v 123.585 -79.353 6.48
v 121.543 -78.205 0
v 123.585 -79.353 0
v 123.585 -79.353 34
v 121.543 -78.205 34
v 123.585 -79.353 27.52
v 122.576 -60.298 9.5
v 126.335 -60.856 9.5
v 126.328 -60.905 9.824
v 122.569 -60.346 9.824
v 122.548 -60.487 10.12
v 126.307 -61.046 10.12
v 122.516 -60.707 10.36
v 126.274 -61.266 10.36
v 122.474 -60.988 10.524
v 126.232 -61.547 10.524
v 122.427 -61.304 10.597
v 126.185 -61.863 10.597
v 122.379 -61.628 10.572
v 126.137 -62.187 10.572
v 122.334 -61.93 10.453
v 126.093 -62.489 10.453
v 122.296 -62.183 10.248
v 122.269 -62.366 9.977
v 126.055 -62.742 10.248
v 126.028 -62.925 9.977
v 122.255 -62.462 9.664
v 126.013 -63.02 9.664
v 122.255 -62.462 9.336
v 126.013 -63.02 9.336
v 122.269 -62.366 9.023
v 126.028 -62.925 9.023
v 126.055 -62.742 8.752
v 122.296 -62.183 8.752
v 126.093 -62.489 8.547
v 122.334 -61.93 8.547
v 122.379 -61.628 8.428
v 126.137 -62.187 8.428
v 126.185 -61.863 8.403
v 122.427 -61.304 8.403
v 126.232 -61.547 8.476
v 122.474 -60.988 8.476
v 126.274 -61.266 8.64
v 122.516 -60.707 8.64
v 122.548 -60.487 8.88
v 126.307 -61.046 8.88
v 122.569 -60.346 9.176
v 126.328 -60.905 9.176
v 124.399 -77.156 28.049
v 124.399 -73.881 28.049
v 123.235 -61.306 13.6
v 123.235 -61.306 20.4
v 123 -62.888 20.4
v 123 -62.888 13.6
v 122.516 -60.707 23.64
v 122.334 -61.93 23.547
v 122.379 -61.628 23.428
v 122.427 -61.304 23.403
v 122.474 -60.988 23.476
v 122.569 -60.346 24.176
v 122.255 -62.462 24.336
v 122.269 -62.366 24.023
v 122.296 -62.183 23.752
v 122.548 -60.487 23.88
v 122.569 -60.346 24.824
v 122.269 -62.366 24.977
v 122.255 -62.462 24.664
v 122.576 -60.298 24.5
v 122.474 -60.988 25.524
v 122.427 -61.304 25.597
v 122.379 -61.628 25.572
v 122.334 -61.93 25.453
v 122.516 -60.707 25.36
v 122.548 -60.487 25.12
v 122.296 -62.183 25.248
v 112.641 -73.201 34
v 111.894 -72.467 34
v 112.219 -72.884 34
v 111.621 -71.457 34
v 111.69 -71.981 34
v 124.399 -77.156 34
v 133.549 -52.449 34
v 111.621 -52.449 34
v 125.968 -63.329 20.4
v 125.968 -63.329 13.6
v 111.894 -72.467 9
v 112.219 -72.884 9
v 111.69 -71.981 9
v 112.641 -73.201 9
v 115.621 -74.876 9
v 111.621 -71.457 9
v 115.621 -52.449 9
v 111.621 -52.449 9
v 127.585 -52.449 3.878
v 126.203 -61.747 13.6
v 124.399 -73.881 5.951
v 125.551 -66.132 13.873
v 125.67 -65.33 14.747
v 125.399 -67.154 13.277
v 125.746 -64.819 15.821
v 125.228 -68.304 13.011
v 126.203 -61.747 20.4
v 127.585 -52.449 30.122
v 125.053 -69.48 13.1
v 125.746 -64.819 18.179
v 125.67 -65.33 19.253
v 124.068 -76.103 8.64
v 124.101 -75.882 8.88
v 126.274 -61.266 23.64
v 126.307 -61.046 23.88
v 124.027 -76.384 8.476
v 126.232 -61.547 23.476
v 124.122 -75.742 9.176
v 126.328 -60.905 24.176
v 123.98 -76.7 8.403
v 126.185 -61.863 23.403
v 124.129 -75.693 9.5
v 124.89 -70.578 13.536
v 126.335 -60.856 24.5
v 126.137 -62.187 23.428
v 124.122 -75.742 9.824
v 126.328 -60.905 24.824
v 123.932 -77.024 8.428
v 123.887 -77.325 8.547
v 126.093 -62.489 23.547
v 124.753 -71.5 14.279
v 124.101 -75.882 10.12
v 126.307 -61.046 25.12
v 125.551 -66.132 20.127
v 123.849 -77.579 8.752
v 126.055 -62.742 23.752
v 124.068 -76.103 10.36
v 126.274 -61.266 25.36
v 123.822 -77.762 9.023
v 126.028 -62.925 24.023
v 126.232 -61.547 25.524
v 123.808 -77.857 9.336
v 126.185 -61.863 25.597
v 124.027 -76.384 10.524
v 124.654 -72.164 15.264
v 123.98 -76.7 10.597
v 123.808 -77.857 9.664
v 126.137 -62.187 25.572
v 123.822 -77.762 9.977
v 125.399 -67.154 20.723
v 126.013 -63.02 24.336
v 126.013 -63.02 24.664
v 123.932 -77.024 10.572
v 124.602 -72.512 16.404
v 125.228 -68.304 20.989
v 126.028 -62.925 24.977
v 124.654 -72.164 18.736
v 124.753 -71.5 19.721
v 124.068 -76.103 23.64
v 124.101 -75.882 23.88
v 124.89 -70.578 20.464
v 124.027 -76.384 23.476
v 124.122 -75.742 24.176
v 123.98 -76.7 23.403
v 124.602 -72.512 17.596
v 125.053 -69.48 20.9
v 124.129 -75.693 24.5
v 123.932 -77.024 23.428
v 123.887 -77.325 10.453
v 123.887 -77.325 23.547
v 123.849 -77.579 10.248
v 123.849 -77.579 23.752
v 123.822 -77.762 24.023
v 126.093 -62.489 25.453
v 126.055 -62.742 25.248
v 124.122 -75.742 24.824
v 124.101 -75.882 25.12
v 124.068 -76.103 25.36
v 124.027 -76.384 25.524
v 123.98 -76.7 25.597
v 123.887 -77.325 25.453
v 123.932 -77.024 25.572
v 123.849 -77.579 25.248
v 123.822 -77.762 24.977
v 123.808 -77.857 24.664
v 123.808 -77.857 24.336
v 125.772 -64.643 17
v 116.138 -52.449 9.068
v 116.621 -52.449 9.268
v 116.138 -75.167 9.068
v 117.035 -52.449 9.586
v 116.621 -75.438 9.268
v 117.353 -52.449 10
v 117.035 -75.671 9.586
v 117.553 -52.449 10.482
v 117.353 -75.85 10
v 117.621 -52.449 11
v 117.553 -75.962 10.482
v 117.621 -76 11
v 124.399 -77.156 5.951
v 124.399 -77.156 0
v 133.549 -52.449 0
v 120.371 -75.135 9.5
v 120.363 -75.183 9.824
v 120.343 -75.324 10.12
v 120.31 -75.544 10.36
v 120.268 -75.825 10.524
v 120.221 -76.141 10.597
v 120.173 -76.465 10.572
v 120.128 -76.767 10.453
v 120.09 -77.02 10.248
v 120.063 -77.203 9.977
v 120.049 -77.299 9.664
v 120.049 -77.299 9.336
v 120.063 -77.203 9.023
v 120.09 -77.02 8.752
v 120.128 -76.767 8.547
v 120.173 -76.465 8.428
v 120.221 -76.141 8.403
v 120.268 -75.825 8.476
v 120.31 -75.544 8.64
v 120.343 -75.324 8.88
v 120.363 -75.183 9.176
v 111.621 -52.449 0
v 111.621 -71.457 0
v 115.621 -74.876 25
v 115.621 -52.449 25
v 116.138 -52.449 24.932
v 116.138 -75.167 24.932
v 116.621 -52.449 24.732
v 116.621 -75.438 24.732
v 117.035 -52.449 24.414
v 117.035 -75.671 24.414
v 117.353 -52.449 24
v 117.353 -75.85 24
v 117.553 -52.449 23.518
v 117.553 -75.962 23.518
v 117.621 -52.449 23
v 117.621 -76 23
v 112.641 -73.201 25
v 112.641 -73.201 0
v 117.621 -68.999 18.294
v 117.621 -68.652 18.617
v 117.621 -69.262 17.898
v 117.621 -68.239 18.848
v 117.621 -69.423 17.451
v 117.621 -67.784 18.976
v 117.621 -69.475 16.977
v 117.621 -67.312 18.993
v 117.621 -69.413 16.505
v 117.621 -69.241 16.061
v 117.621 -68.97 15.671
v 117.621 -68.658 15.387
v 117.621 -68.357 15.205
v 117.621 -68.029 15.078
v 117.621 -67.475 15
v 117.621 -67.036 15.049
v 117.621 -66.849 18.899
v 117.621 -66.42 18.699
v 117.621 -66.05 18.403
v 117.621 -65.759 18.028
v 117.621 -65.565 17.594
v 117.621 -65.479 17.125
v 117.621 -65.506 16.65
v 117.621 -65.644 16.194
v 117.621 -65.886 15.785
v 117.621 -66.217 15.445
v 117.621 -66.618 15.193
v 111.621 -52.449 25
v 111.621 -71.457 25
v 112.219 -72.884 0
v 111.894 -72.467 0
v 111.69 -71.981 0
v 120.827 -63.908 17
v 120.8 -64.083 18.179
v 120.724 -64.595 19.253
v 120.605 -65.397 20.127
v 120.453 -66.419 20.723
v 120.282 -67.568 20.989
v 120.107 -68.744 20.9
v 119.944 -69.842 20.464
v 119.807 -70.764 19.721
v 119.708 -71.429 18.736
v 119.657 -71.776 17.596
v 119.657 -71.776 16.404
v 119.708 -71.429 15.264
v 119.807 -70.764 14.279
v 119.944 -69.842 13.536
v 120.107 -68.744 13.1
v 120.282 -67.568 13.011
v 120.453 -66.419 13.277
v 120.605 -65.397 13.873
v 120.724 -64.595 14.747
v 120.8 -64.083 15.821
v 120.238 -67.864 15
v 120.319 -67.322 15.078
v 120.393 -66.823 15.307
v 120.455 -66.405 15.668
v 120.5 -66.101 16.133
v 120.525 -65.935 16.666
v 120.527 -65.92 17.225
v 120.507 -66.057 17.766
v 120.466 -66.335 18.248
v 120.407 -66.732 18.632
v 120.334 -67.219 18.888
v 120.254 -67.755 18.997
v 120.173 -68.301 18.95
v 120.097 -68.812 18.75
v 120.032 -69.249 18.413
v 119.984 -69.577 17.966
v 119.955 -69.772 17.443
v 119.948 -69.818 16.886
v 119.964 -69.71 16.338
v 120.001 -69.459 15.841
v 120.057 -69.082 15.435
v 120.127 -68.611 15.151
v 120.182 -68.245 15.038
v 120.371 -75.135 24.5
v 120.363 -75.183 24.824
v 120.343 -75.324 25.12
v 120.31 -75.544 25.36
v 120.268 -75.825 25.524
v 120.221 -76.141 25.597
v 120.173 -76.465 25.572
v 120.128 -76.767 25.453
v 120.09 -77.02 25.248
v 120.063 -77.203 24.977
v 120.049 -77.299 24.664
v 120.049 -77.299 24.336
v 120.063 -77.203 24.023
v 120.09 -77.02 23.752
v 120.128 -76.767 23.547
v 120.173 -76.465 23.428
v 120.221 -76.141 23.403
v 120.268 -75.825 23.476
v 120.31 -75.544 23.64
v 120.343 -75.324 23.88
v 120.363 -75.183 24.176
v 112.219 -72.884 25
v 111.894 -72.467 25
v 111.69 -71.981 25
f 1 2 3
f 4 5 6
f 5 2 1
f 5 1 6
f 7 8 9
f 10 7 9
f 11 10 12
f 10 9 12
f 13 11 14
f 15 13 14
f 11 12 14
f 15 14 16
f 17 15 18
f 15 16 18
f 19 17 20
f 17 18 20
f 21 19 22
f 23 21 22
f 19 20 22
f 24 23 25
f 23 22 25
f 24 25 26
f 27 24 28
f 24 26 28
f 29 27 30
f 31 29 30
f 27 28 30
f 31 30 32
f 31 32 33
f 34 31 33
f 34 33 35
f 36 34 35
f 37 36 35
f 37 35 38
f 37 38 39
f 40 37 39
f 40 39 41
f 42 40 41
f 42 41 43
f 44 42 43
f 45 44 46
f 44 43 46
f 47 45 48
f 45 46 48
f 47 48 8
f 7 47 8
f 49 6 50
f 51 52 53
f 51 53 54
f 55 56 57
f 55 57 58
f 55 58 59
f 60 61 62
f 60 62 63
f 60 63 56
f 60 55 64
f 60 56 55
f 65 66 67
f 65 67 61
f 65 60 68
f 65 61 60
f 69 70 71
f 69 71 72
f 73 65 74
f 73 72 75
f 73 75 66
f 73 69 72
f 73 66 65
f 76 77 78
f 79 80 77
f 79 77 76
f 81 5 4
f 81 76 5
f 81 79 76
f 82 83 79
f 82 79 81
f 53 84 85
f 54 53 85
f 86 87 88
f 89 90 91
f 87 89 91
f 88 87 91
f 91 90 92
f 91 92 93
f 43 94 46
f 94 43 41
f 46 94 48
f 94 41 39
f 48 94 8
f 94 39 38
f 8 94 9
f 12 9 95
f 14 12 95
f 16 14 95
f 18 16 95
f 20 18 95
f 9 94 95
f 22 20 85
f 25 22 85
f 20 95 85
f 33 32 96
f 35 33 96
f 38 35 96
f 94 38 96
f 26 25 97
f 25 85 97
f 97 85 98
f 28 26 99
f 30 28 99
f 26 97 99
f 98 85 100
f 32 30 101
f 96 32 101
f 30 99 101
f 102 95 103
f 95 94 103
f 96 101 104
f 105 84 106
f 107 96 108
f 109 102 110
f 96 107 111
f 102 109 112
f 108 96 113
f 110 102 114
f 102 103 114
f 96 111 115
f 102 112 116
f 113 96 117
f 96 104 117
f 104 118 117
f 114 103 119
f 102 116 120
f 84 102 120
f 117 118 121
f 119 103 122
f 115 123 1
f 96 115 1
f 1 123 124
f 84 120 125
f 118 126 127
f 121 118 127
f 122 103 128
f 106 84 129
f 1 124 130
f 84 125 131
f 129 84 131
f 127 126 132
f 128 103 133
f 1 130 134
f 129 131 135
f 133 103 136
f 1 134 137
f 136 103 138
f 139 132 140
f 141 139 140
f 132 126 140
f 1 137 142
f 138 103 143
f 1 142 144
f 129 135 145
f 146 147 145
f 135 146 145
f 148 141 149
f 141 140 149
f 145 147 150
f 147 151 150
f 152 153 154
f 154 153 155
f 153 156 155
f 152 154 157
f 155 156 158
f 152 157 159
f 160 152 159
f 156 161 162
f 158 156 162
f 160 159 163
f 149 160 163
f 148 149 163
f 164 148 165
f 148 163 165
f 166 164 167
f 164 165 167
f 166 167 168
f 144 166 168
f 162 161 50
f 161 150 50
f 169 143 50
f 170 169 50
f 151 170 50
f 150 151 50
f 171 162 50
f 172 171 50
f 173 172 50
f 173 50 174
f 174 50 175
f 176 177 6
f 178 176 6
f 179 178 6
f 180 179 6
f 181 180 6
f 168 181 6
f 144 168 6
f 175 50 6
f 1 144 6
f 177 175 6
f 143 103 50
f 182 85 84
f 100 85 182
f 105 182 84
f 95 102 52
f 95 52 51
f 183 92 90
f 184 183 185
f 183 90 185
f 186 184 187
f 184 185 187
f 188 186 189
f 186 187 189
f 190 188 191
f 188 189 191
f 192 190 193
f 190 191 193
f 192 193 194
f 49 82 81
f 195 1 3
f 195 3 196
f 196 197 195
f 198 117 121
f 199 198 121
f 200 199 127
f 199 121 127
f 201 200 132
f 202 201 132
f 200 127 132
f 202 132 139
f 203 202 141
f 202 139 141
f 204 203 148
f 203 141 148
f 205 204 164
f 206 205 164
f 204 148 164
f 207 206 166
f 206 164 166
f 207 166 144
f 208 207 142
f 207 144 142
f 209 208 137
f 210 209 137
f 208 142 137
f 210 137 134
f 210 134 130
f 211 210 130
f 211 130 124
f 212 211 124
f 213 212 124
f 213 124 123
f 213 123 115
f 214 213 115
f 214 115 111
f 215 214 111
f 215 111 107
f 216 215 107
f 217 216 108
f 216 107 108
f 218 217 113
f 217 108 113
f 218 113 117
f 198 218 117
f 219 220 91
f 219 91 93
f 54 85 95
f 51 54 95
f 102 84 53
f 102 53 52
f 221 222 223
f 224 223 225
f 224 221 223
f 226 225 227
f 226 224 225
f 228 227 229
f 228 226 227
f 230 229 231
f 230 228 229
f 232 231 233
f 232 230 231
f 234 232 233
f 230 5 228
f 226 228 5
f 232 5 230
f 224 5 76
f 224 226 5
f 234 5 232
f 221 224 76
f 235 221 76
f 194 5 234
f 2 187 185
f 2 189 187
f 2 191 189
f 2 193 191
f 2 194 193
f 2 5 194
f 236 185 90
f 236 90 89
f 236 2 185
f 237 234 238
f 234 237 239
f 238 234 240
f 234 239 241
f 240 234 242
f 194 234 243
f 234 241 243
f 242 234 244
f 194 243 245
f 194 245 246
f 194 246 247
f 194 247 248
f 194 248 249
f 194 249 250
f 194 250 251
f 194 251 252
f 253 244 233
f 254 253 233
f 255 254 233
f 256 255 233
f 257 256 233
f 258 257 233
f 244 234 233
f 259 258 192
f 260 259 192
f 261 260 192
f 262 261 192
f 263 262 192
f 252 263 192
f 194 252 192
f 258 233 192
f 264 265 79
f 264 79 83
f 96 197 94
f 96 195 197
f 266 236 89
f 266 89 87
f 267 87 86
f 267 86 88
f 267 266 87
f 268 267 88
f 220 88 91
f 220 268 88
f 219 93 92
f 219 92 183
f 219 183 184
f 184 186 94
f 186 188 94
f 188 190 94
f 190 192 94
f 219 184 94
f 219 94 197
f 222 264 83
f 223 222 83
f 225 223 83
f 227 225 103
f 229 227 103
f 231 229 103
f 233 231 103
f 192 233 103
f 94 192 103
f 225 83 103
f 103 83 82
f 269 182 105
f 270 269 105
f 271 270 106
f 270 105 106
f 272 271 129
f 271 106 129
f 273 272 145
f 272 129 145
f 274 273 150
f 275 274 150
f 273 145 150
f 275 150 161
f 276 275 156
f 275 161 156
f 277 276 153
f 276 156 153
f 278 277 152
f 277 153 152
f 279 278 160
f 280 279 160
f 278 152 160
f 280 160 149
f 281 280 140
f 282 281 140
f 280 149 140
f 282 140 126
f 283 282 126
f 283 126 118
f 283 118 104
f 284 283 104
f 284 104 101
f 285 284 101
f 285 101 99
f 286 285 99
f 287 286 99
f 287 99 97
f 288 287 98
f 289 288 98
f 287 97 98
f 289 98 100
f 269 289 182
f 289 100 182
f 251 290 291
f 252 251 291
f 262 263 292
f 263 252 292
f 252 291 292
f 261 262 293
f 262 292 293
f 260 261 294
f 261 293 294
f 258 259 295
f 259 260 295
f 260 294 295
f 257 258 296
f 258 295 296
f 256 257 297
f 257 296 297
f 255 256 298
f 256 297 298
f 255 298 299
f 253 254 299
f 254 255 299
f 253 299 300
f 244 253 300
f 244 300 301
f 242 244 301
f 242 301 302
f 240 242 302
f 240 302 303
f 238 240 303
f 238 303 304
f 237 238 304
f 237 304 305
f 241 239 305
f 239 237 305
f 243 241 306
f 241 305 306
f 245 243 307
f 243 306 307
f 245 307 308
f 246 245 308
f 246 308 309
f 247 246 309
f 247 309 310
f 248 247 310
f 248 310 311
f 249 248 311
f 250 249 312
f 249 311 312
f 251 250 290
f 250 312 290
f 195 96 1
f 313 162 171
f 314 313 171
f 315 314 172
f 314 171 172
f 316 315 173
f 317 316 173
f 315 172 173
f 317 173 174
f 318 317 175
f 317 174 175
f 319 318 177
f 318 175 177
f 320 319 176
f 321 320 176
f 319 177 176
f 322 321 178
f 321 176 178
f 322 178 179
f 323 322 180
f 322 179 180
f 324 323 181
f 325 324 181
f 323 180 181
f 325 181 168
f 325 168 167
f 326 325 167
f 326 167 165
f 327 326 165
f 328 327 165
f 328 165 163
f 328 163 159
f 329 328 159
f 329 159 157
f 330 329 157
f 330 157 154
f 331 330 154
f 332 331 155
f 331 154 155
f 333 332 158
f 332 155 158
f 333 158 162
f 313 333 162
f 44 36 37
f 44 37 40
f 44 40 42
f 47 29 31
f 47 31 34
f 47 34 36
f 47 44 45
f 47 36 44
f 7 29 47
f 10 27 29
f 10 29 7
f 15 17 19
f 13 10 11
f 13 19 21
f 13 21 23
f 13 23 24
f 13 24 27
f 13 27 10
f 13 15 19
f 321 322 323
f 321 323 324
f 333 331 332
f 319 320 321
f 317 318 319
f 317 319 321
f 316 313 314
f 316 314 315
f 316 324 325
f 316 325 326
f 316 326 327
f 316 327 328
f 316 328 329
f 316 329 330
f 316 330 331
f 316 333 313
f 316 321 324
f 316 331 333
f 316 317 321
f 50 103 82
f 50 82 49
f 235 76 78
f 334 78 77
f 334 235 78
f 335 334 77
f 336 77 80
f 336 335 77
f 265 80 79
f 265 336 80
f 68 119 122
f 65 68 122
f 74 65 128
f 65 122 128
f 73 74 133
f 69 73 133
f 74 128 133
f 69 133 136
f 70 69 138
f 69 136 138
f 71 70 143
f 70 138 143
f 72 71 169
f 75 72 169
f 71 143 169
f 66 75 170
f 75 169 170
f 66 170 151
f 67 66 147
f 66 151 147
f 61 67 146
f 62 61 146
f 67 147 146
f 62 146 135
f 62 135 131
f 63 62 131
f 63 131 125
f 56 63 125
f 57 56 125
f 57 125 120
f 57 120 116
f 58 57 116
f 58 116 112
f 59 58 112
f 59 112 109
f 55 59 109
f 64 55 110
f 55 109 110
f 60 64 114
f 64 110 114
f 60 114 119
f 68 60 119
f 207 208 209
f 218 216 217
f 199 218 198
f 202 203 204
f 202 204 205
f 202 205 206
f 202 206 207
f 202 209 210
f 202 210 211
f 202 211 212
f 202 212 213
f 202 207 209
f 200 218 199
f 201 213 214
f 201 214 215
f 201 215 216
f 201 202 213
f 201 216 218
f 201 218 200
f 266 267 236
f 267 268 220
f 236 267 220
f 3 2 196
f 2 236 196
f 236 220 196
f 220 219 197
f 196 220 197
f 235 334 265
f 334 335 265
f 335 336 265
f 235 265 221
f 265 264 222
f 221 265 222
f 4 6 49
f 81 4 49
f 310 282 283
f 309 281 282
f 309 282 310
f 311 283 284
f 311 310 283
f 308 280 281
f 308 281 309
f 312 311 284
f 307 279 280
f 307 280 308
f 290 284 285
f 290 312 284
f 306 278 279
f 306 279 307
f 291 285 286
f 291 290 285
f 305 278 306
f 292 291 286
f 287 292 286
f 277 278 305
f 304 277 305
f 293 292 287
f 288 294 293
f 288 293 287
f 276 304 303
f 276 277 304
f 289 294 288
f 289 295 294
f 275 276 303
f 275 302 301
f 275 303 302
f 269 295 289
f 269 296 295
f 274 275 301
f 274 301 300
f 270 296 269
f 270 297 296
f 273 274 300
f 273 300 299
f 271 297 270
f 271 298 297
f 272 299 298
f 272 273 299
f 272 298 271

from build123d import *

# Parameters (mm, degrees)
EXTRUDE_1_DEPTH             = 34
CUT_EXTRUDE_1_DEPTH         = 34
CUT_EXTRUDE_12_DEPTH        = 147.490797926
FILLET_1_R                  = 2
CUT_EXTRUDE_13_DEPTH        = 166.02110084
CUT_EXTRUDE_14_DEPTH        = 141.242418962
CUT_EXTRUDE_15_DEPTH        = 141.242418962
EXTRUDE_2_DEPTH             = 34
CUT_EXTRUDE_16_DEPTH        = 141.410480916
EXTRUDE_3_REACH             = 158.273
EXTRUDE_3_DIRECTION_2_REACH = 158.273
SKETCH_24_R                 = 1.1
CUT_EXTRUDE_18_DEPTH        = 3.8
SKETCH_25_RX                = 2
SKETCH_25_RY                = 1.978256004
CUT_EXTRUDE_19_DEPTH        = 8
SKETCH_26_W                 = 6.8
SKETCH_26_H                 = 1.6
CUT_EXTRUDE_20_DEPTH        = 3
SKETCH_27_R                 = 4
SKETCH_27_RX                = 2
SKETCH_27_RY                = 1.978256004
CUT_EXTRUDE_21_DEPTH        = 5


with BuildPart() as part:
    # 草图1 → 凸台-拉伸1 (new body)
    with BuildSketch(Plane.XY):
        with BuildLine():
            Line((111.620742166, -71.457480545), (111.620742166, -52.448586741))
            Line((111.620742166, -52.448586741), (139.548665218, -52.448586741))
            Line((139.548665218, -52.448586741), (129.36488038, -79.948071529))
            ThreePointArc((129.36488038, -79.948071529), (128.178923794, -81.130879534), (126.509316799, -80.996938193))
            Line((126.509316799, -80.996938193), (112.640702972, -73.200903379))
            ThreePointArc((112.640702972, -73.200903379), (111.894463164, -72.467411635), (111.620742166, -71.457480545))
        make_face()
    extrude(amount=EXTRUDE_1_DEPTH)

    # 草图2 → 切除-拉伸1 (cut)
    with BuildSketch(Plane(origin=(0, -52.448586741, 0), x_dir=(1, 0, 0), z_dir=(0, 1, 0))):
        Polygon((129.36488038, -30), (129.36488038, -4), (139.548665218, 0), (139.548665218, -34), align=None)
    extrude(amount=-CUT_EXTRUDE_1_DEPTH, mode=Mode.SUBTRACT)

    # 草图14 → 切除-拉伸12 (cut, through all)
    with BuildSketch(Plane(origin=(0, -52.448586741, 0), x_dir=(1, 0, 0), z_dir=(0, 1, 0))):
        Polygon((111.620742166, -9), (111.620742166, -17), (111.620742166, -25), (117.620742166, -25), (117.620742166, -9), align=None)
    extrude(amount=-CUT_EXTRUDE_12_DEPTH, mode=Mode.SUBTRACT)

    # 圆角1
    fillet_1_edges = [part.edges().sort_by_distance(p)[0] for p in [
        (117.620742166, -64.22447251, 25),
        (117.620742166, -64.22447251, 9),
    ]]
    fillet(fillet_1_edges, radius=FILLET_1_R)

    # 草图15 → 切除-拉伸13 (cut, through all)
    with BuildSketch(Plane.XY.offset(34)):
        with BuildLine():
            Line((129.36488038, -79.948071529), (139.548665218, -52.448586741))
            Line((139.548665218, -52.448586741), (133.548665218, -52.448586741))
            Line((133.548665218, -52.448586741), (124.398706092, -77.156410579))
            ThreePointArc((124.398706092, -77.156410579), (123.212749507, -78.339218585), (121.543142511, -78.205277244))
            Line((121.543142511, -78.205277244), (126.509316799, -80.996938193))
            ThreePointArc((126.509316799, -80.996938193), (128.178923794, -81.130879534), (129.36488038, -79.948071529))
        make_face()
    extrude(amount=-CUT_EXTRUDE_13_DEPTH, mode=Mode.SUBTRACT)

    # 草图16 → 切除-拉伸14 (cut, through all)
    with BuildSketch(Plane(origin=(0, -52.448586741, 0), x_dir=(1, 0, 0), z_dir=(0, 1, 0))):
        Polygon((124.398706092, -5.950620272), (124.398706092, -28.049379728), (129.36488038, -30), (129.36488038, -4), align=None)
    extrude(amount=-CUT_EXTRUDE_14_DEPTH, mode=Mode.SUBTRACT)

    # 草图17 → 切除-拉伸15 (cut, through all)
    with BuildSketch(Plane(origin=(0, -52.448586741, 0), x_dir=(1, 0, 0), z_dir=(0, 1, 0))):
        Polygon((124.398706092, -5.950620272), (124.398706092, -28.049379728), (133.548665218, -34), (133.548665218, 0), align=None)
    extrude(amount=-CUT_EXTRUDE_15_DEPTH, mode=Mode.SUBTRACT)

    # 草图18 → 凸台-拉伸2 (add)
    with BuildSketch(Plane.XY.offset(34)):
        with BuildLine():
            Line((121.543142511, -78.205277244), (123.585184196, -79.353180579))
            Line((123.585184196, -79.353180579), (124.398706092, -77.156410579))
            ThreePointArc((124.398706092, -77.156410579), (123.212749507, -78.339218585), (121.543142511, -78.205277244))
        make_face()
    extrude(amount=-EXTRUDE_2_DEPTH)

    # 草图21 → 切除-拉伸16 (cut, through all)
    with BuildSketch(Plane(origin=(0, -52.448586741, 0), x_dir=(1, 0, 0), z_dir=(0, 1, 0))):
        Polygon((123.585184196, -6.47968929), (123.585184196, -27.52031071), (124.398706092, -28.049379728), (124.398706092, -5.950620272), align=None)
    extrude(amount=-CUT_EXTRUDE_16_DEPTH, mode=Mode.SUBTRACT)

    # 凸台-拉伸3: up to this plane
    extrude_3_end = Plane(origin=(133.548665218, -78.46185441, 34), z_dir=(-0.5451910137179772, 0, 0.8383118504239127))
    # 草图22 → 凸台-拉伸3 (add, up to the surface)
    with BuildSketch(Plane.XY.offset(17), mode=Mode.PRIVATE) as extrude_3_sk1:
        Polygon((127.585184196, -52.448586741), (123.585184196, -79.353180579), (123.585184196, -52.448586741), align=None)
    extrude_3_tool1 = split(extrude(extrude_3_sk1.sketch, amount=EXTRUDE_3_REACH, mode=Mode.PRIVATE), bisect_by=extrude_3_end, keep=Keep.BOTH, mode=Mode.PRIVATE)
    add(extrude_3_tool1.solids().sort_by_distance((124.918518, -61.416785, 17))[0])

    # 凸台-拉伸3 direction 2: up to this plane
    extrude_3_direction_2_end = Plane(origin=(133.548665218, -78.46185441, 0), z_dir=(-0.5451910137179766, 0, -0.838311850423913))
    # 草图22 → 凸台-拉伸3 direction 2 (add, up to the surface)
    with BuildSketch(Plane.XY.offset(17), mode=Mode.PRIVATE) as extrude_3_direction_2_sk1:
        Polygon((127.585184196, -52.448586741), (123.585184196, -79.353180579), (123.585184196, -52.448586741), align=None)
    extrude_3_direction_2_tool1 = split(extrude(extrude_3_direction_2_sk1.sketch, amount=-EXTRUDE_3_DIRECTION_2_REACH, mode=Mode.PRIVATE), bisect_by=extrude_3_direction_2_end, keep=Keep.BOTH, mode=Mode.PRIVATE)
    add(extrude_3_direction_2_tool1.solids().sort_by_distance((124.918518, -61.416785, 17))[0])

    # 草图24 → 切除-拉伸18 (cut)
    with BuildSketch(Plane(origin=(132.455135986, -19.69256801, -116.943153128), x_dir=(0, 0, -1), z_dir=(0.9891280019770362, -0.1470571171515218, 0))):
        with Locations(Location((-141.443153128, -57.716372046, 0), (0, 0, 90))):
            Circle(SKETCH_24_R)
        with Locations(Location((-126.443153128, -57.716372046, 0), (0, 0, 90))):
            Circle(SKETCH_24_R)
        with Locations(Location((-141.443153128, -42.716372046, 0), (0, 0, 90))):
            Circle(SKETCH_24_R)
        with Locations(Location((-126.443153128, -42.716372046, 0), (0, 0, 90))):
            Circle(SKETCH_24_R)
    extrude(amount=-CUT_EXTRUDE_18_DEPTH, mode=Mode.SUBTRACT)

    # 草图25 → 切除-拉伸19 (cut)
    with BuildSketch(Plane(origin=(132.455135986, -19.69256801, -116.943153128), x_dir=(0, 0, -1), z_dir=(0.9891280019770362, -0.1470571171515218, 0))):
        with Locations((-133.943153128, -49.444294674)):
            Ellipse(SKETCH_25_RX, SKETCH_25_RY)
    extrude(amount=-CUT_EXTRUDE_19_DEPTH, mode=Mode.SUBTRACT)

    # 草图26 → 切除-拉伸20 (cut)
    with BuildSketch(Plane(origin=(132.455135986, -19.69256801, -116.943153128), x_dir=(0, 0, -1), z_dir=(0.9891280019770362, -0.1470571171515218, 0))):
        with Locations((-133.943153128, -43.316372046)):
            Rectangle(SKETCH_26_W, SKETCH_26_H)
    extrude(amount=-CUT_EXTRUDE_20_DEPTH, mode=Mode.SUBTRACT)

    # 草图27 → 切除-拉伸21 (cut)
    with BuildSketch(Plane(origin=(132.455135986, -19.69256801, 0), x_dir=(0, 0, -1), z_dir=(0.9891280019770362, -0.1470571171515218, 0))):
        with Locations(Location((-17, -49.444294674, 0), (0, 0, 90))):
            Circle(SKETCH_27_R)
        with Locations((-17, -49.444294674)):
            Ellipse(SKETCH_27_RX, SKETCH_27_RY, mode=Mode.SUBTRACT)
    extrude(amount=-CUT_EXTRUDE_21_DEPTH, mode=Mode.SUBTRACT)


solid = part.part
